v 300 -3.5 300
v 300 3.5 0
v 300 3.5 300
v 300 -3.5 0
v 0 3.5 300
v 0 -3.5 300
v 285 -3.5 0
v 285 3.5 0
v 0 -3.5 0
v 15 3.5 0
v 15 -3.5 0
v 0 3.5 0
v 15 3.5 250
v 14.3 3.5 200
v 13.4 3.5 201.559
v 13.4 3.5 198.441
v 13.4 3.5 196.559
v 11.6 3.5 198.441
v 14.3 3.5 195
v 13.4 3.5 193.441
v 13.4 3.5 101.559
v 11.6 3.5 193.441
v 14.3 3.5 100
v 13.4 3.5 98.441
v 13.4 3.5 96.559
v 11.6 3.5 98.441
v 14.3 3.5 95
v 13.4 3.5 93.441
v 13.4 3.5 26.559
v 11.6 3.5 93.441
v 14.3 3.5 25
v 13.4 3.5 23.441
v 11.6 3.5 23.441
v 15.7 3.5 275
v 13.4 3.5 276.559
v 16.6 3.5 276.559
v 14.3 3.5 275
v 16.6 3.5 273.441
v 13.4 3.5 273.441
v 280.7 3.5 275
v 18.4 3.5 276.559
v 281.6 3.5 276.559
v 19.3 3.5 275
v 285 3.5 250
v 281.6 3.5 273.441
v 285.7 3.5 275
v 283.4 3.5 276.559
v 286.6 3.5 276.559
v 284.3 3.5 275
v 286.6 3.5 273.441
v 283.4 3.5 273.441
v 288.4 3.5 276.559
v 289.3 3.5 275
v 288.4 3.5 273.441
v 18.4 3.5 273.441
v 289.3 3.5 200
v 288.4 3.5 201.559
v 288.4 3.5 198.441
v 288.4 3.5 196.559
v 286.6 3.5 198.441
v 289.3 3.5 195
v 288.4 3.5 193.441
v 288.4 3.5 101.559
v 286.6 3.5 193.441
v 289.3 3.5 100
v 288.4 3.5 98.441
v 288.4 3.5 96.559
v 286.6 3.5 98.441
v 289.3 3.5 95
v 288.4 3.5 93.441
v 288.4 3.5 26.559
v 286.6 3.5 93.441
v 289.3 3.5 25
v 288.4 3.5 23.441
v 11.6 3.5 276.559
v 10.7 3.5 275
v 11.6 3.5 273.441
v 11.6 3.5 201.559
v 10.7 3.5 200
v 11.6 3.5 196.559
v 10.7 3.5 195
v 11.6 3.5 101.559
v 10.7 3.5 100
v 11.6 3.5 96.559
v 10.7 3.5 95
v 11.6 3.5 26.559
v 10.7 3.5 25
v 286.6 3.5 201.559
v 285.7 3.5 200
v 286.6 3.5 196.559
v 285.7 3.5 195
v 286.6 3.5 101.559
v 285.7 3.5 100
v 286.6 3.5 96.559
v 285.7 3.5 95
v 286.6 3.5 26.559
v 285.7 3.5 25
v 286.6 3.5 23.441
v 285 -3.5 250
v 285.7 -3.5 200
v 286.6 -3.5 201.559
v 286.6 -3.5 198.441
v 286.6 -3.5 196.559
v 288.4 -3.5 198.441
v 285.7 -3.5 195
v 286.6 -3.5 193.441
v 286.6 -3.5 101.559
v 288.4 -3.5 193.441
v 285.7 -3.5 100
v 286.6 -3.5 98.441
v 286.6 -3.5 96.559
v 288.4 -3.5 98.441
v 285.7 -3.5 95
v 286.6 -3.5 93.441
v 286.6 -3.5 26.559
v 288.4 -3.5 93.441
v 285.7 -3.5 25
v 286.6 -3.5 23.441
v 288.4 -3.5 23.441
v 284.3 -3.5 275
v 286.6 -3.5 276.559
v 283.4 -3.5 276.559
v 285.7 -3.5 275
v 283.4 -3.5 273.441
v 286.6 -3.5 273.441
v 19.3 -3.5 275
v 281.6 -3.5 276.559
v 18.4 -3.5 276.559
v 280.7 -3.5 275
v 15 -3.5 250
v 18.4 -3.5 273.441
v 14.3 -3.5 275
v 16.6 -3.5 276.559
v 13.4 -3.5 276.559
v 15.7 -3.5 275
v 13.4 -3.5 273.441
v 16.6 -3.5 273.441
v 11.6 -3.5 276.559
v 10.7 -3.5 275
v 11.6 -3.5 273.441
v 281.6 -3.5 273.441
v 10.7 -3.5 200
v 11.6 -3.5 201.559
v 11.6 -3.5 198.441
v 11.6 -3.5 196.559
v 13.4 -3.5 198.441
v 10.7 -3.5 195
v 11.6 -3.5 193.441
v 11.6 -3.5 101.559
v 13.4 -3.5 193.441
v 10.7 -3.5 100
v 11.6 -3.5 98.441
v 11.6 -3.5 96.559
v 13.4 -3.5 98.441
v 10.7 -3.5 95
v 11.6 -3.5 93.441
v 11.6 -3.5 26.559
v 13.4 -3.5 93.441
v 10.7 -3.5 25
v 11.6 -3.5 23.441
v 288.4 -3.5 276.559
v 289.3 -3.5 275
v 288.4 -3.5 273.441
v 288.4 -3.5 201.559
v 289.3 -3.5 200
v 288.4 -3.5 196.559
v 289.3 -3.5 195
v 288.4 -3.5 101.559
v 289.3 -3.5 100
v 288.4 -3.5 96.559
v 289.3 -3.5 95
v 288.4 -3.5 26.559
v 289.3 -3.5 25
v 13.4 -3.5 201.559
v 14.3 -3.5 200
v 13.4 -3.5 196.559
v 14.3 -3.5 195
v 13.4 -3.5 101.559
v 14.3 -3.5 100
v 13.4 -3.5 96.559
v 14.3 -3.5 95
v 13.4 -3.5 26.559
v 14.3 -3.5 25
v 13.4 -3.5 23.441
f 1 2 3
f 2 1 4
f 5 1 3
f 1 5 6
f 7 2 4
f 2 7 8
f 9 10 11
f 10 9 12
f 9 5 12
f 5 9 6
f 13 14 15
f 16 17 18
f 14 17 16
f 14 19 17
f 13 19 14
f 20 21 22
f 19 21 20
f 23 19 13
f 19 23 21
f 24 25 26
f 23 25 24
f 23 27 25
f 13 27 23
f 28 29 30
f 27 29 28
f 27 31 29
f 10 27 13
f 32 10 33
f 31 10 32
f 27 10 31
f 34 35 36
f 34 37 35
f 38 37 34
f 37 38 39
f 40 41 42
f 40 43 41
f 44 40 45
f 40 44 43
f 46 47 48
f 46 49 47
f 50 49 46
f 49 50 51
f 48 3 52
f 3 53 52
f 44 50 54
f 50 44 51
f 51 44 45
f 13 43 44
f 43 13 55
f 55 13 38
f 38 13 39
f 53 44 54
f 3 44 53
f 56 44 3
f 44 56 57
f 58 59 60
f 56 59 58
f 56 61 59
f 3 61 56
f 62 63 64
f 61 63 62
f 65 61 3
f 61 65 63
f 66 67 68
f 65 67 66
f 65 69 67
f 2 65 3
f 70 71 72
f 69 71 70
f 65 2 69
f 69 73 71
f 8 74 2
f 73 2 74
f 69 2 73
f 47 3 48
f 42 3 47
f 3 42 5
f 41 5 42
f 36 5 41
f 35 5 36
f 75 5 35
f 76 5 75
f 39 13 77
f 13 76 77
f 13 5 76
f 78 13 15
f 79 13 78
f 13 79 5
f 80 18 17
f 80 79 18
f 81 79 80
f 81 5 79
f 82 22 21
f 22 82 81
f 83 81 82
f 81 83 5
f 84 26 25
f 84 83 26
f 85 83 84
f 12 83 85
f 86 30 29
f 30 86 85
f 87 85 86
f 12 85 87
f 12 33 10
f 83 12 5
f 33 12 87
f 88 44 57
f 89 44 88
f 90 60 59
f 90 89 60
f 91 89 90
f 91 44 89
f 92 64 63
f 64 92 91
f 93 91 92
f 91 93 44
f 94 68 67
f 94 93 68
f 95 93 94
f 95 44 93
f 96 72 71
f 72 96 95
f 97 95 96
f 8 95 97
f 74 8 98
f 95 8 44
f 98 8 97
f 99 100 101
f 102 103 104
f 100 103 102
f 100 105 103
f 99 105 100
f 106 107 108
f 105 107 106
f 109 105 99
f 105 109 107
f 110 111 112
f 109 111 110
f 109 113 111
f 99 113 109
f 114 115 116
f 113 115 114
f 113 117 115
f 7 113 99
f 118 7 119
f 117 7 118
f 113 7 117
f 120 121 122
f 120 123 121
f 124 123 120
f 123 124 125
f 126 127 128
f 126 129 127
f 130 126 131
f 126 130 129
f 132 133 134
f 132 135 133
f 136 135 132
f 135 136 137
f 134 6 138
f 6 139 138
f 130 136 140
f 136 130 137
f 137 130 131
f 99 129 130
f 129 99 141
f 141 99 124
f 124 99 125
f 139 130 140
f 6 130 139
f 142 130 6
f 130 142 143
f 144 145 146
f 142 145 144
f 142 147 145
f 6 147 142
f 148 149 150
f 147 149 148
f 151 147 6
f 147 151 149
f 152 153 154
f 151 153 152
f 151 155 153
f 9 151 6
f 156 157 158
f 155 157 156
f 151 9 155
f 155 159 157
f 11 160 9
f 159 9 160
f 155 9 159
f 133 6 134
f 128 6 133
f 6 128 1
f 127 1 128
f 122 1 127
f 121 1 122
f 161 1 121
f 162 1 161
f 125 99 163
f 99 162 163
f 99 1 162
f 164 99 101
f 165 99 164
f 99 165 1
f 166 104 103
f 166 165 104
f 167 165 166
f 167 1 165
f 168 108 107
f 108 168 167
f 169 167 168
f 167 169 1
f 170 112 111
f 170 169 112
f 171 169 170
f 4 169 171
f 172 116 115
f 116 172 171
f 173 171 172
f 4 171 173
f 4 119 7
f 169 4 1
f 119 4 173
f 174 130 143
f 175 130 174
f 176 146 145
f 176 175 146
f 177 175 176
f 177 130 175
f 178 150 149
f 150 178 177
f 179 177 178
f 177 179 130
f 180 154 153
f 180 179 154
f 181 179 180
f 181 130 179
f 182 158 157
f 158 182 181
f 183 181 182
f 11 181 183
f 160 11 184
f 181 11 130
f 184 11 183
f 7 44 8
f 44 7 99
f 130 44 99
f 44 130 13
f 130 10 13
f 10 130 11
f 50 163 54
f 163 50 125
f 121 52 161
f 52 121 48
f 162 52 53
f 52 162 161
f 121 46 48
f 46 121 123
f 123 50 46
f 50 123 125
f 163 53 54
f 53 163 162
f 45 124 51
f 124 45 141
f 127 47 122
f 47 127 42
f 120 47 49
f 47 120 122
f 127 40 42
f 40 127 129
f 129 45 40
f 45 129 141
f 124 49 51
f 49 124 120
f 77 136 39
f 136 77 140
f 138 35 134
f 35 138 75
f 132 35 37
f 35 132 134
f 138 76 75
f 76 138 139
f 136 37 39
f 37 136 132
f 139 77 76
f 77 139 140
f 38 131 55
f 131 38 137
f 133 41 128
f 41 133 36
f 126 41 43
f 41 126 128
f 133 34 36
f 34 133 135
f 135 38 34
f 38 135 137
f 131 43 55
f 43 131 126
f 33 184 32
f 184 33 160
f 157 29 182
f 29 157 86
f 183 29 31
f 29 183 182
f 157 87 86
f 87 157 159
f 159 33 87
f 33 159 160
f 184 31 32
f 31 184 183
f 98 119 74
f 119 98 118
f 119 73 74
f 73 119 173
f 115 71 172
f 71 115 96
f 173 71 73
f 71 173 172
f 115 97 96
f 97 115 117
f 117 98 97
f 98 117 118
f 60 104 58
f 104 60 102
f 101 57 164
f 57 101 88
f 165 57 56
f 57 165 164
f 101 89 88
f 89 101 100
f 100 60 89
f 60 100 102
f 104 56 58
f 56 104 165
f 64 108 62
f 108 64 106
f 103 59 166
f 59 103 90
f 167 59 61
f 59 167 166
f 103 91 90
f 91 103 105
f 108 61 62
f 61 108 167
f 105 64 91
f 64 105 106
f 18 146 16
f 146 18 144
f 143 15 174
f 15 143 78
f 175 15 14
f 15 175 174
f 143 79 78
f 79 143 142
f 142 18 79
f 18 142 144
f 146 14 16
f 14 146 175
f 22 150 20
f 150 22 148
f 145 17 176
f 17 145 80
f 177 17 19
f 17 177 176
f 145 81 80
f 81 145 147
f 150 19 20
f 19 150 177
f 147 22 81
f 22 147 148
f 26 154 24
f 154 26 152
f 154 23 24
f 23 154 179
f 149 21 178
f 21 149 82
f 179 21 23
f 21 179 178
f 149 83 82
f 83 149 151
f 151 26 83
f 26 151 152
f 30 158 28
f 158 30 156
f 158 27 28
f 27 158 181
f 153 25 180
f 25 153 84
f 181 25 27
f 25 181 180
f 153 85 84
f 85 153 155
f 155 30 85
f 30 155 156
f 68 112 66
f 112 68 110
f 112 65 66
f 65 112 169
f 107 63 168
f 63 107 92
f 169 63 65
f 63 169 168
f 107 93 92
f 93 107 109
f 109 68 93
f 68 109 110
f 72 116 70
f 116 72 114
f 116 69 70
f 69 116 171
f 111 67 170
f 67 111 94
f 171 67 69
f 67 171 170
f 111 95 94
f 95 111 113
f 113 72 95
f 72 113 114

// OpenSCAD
//EVERYBODY ELSE IS USING THESE SAME VARIABLES SO USE THEM AND DO NOT CHANGE ANYTHING UNLESS THERE'S A GOOD FUCKING REASON
wholex=300;
wholey=300;
wholez=300;
thickness=7;
xysmoothr=4;
zsmoothr=5;
zleadr=2.5;
m3=1.8;
res=20;



//thickness of sides which motors and smoothrods mount to
sidethickness=30;
//thickness of top part, should not be the limiting factor of build height, smooth rod height, and smooth rod point of attachment will be.
topthickness=50;


translate([wholex/2,0,wholez/2])frontplate();


//These are the variables describing the cube which is subtracted from the larger front plate.
//s=size
sx=wholex-sidethickness;
sy=thickness+1;
sz=wholez-topthickness;

//These are the coordinates of the cylinders which represent the screwholes for the smooth rods and the motor mount. "cyl" is short for cylinder. 
cylx=137.5*wholex/300;
cyly=125*wholey/300;
cylz=125*wholez/300;

//Each pair of screwholes is separated by 5mm along the x-axis. Keep in mind that you might have to space the top and bottom screwholes differently in the final product, which would require that you create a different variable.
separation=5;

//Here are the z-coordinates of some more cylinders. Be ready to create another variable for their height or separation in the final product.
cilz=50*wholez/300;

//This is the front plate, aka the xz plate.

module frontplate(){
difference(){
cube(size=[wholex,thickness,wholez],center=true);

//Everything below this is the subtracted part.
#translate([0,0,-(wholez-sz)/2])cube([sx,sy,sz],center=true);

//These cylinders represent the screwholes holding the smooth rods in place.

#translate([cylx,cyly,cylz])rotate([90,0,0])cylinder(h=wholey,r=m3);
#translate([cylx-separation,cyly,cylz])rotate([90,0,0])cylinder(h=wholey,r=m3);
#translate([-cylx,cyly,cylz])rotate([90,0,0])cylinder(h=wholey,r=m3);
#translate([separation-cylx,cyly,cylz])rotate([90,0,0])cylinder(h=wholey,r=m3);

//These represent the screwholes that connect to the motor mount.
#translate([-cylx,cyly,-cylz])rotate([90,0,0])cylinder(h=wholey,r=m3);
#translate([separation-cylx,cyly,-cylz])rotate([90,0,0])cylinder(h=wholey,r=m3);
#translate([cylx,cyly,-cylz])rotate([90,0,0])cylinder(h=wholey,r=m3);
#translate([cylx-separation,cyly,-cylz])rotate([90,0,0])cylinder(h=wholey,r=m3);

//holes for bracket interface to attach right and left brace to front plate
#translate([cylx,cyly,cilz])rotate([90,0,0])cylinder(h=wholey,r=m3);
#translate([cylx,cyly,cilz-separation])rotate([90,0,0])cylinder(h=wholey,r=m3);
#translate([-cylx,cyly,cilz])rotate([90,0,0])cylinder(h=wholey,r=m3);
#translate([-cylx,cyly,cilz-separation])rotate([90,0,0])cylinder(h=wholey,r=m3);
#translate([-cylx,cyly,-cilz])rotate([90,0,0])cylinder(h=wholey,r=m3);
#translate([-cylx,cyly,-cilz-separation])rotate([90,0,0])cylinder(h=wholey,r=m3);
#translate([cylx,cyly,-cilz])rotate([90,0,0])cylinder(h=wholey,r=m3);
#translate([cylx,cyly,-cilz-separation])rotate([90,0,0])cylinder(h=wholey,r=m3);
}
}
